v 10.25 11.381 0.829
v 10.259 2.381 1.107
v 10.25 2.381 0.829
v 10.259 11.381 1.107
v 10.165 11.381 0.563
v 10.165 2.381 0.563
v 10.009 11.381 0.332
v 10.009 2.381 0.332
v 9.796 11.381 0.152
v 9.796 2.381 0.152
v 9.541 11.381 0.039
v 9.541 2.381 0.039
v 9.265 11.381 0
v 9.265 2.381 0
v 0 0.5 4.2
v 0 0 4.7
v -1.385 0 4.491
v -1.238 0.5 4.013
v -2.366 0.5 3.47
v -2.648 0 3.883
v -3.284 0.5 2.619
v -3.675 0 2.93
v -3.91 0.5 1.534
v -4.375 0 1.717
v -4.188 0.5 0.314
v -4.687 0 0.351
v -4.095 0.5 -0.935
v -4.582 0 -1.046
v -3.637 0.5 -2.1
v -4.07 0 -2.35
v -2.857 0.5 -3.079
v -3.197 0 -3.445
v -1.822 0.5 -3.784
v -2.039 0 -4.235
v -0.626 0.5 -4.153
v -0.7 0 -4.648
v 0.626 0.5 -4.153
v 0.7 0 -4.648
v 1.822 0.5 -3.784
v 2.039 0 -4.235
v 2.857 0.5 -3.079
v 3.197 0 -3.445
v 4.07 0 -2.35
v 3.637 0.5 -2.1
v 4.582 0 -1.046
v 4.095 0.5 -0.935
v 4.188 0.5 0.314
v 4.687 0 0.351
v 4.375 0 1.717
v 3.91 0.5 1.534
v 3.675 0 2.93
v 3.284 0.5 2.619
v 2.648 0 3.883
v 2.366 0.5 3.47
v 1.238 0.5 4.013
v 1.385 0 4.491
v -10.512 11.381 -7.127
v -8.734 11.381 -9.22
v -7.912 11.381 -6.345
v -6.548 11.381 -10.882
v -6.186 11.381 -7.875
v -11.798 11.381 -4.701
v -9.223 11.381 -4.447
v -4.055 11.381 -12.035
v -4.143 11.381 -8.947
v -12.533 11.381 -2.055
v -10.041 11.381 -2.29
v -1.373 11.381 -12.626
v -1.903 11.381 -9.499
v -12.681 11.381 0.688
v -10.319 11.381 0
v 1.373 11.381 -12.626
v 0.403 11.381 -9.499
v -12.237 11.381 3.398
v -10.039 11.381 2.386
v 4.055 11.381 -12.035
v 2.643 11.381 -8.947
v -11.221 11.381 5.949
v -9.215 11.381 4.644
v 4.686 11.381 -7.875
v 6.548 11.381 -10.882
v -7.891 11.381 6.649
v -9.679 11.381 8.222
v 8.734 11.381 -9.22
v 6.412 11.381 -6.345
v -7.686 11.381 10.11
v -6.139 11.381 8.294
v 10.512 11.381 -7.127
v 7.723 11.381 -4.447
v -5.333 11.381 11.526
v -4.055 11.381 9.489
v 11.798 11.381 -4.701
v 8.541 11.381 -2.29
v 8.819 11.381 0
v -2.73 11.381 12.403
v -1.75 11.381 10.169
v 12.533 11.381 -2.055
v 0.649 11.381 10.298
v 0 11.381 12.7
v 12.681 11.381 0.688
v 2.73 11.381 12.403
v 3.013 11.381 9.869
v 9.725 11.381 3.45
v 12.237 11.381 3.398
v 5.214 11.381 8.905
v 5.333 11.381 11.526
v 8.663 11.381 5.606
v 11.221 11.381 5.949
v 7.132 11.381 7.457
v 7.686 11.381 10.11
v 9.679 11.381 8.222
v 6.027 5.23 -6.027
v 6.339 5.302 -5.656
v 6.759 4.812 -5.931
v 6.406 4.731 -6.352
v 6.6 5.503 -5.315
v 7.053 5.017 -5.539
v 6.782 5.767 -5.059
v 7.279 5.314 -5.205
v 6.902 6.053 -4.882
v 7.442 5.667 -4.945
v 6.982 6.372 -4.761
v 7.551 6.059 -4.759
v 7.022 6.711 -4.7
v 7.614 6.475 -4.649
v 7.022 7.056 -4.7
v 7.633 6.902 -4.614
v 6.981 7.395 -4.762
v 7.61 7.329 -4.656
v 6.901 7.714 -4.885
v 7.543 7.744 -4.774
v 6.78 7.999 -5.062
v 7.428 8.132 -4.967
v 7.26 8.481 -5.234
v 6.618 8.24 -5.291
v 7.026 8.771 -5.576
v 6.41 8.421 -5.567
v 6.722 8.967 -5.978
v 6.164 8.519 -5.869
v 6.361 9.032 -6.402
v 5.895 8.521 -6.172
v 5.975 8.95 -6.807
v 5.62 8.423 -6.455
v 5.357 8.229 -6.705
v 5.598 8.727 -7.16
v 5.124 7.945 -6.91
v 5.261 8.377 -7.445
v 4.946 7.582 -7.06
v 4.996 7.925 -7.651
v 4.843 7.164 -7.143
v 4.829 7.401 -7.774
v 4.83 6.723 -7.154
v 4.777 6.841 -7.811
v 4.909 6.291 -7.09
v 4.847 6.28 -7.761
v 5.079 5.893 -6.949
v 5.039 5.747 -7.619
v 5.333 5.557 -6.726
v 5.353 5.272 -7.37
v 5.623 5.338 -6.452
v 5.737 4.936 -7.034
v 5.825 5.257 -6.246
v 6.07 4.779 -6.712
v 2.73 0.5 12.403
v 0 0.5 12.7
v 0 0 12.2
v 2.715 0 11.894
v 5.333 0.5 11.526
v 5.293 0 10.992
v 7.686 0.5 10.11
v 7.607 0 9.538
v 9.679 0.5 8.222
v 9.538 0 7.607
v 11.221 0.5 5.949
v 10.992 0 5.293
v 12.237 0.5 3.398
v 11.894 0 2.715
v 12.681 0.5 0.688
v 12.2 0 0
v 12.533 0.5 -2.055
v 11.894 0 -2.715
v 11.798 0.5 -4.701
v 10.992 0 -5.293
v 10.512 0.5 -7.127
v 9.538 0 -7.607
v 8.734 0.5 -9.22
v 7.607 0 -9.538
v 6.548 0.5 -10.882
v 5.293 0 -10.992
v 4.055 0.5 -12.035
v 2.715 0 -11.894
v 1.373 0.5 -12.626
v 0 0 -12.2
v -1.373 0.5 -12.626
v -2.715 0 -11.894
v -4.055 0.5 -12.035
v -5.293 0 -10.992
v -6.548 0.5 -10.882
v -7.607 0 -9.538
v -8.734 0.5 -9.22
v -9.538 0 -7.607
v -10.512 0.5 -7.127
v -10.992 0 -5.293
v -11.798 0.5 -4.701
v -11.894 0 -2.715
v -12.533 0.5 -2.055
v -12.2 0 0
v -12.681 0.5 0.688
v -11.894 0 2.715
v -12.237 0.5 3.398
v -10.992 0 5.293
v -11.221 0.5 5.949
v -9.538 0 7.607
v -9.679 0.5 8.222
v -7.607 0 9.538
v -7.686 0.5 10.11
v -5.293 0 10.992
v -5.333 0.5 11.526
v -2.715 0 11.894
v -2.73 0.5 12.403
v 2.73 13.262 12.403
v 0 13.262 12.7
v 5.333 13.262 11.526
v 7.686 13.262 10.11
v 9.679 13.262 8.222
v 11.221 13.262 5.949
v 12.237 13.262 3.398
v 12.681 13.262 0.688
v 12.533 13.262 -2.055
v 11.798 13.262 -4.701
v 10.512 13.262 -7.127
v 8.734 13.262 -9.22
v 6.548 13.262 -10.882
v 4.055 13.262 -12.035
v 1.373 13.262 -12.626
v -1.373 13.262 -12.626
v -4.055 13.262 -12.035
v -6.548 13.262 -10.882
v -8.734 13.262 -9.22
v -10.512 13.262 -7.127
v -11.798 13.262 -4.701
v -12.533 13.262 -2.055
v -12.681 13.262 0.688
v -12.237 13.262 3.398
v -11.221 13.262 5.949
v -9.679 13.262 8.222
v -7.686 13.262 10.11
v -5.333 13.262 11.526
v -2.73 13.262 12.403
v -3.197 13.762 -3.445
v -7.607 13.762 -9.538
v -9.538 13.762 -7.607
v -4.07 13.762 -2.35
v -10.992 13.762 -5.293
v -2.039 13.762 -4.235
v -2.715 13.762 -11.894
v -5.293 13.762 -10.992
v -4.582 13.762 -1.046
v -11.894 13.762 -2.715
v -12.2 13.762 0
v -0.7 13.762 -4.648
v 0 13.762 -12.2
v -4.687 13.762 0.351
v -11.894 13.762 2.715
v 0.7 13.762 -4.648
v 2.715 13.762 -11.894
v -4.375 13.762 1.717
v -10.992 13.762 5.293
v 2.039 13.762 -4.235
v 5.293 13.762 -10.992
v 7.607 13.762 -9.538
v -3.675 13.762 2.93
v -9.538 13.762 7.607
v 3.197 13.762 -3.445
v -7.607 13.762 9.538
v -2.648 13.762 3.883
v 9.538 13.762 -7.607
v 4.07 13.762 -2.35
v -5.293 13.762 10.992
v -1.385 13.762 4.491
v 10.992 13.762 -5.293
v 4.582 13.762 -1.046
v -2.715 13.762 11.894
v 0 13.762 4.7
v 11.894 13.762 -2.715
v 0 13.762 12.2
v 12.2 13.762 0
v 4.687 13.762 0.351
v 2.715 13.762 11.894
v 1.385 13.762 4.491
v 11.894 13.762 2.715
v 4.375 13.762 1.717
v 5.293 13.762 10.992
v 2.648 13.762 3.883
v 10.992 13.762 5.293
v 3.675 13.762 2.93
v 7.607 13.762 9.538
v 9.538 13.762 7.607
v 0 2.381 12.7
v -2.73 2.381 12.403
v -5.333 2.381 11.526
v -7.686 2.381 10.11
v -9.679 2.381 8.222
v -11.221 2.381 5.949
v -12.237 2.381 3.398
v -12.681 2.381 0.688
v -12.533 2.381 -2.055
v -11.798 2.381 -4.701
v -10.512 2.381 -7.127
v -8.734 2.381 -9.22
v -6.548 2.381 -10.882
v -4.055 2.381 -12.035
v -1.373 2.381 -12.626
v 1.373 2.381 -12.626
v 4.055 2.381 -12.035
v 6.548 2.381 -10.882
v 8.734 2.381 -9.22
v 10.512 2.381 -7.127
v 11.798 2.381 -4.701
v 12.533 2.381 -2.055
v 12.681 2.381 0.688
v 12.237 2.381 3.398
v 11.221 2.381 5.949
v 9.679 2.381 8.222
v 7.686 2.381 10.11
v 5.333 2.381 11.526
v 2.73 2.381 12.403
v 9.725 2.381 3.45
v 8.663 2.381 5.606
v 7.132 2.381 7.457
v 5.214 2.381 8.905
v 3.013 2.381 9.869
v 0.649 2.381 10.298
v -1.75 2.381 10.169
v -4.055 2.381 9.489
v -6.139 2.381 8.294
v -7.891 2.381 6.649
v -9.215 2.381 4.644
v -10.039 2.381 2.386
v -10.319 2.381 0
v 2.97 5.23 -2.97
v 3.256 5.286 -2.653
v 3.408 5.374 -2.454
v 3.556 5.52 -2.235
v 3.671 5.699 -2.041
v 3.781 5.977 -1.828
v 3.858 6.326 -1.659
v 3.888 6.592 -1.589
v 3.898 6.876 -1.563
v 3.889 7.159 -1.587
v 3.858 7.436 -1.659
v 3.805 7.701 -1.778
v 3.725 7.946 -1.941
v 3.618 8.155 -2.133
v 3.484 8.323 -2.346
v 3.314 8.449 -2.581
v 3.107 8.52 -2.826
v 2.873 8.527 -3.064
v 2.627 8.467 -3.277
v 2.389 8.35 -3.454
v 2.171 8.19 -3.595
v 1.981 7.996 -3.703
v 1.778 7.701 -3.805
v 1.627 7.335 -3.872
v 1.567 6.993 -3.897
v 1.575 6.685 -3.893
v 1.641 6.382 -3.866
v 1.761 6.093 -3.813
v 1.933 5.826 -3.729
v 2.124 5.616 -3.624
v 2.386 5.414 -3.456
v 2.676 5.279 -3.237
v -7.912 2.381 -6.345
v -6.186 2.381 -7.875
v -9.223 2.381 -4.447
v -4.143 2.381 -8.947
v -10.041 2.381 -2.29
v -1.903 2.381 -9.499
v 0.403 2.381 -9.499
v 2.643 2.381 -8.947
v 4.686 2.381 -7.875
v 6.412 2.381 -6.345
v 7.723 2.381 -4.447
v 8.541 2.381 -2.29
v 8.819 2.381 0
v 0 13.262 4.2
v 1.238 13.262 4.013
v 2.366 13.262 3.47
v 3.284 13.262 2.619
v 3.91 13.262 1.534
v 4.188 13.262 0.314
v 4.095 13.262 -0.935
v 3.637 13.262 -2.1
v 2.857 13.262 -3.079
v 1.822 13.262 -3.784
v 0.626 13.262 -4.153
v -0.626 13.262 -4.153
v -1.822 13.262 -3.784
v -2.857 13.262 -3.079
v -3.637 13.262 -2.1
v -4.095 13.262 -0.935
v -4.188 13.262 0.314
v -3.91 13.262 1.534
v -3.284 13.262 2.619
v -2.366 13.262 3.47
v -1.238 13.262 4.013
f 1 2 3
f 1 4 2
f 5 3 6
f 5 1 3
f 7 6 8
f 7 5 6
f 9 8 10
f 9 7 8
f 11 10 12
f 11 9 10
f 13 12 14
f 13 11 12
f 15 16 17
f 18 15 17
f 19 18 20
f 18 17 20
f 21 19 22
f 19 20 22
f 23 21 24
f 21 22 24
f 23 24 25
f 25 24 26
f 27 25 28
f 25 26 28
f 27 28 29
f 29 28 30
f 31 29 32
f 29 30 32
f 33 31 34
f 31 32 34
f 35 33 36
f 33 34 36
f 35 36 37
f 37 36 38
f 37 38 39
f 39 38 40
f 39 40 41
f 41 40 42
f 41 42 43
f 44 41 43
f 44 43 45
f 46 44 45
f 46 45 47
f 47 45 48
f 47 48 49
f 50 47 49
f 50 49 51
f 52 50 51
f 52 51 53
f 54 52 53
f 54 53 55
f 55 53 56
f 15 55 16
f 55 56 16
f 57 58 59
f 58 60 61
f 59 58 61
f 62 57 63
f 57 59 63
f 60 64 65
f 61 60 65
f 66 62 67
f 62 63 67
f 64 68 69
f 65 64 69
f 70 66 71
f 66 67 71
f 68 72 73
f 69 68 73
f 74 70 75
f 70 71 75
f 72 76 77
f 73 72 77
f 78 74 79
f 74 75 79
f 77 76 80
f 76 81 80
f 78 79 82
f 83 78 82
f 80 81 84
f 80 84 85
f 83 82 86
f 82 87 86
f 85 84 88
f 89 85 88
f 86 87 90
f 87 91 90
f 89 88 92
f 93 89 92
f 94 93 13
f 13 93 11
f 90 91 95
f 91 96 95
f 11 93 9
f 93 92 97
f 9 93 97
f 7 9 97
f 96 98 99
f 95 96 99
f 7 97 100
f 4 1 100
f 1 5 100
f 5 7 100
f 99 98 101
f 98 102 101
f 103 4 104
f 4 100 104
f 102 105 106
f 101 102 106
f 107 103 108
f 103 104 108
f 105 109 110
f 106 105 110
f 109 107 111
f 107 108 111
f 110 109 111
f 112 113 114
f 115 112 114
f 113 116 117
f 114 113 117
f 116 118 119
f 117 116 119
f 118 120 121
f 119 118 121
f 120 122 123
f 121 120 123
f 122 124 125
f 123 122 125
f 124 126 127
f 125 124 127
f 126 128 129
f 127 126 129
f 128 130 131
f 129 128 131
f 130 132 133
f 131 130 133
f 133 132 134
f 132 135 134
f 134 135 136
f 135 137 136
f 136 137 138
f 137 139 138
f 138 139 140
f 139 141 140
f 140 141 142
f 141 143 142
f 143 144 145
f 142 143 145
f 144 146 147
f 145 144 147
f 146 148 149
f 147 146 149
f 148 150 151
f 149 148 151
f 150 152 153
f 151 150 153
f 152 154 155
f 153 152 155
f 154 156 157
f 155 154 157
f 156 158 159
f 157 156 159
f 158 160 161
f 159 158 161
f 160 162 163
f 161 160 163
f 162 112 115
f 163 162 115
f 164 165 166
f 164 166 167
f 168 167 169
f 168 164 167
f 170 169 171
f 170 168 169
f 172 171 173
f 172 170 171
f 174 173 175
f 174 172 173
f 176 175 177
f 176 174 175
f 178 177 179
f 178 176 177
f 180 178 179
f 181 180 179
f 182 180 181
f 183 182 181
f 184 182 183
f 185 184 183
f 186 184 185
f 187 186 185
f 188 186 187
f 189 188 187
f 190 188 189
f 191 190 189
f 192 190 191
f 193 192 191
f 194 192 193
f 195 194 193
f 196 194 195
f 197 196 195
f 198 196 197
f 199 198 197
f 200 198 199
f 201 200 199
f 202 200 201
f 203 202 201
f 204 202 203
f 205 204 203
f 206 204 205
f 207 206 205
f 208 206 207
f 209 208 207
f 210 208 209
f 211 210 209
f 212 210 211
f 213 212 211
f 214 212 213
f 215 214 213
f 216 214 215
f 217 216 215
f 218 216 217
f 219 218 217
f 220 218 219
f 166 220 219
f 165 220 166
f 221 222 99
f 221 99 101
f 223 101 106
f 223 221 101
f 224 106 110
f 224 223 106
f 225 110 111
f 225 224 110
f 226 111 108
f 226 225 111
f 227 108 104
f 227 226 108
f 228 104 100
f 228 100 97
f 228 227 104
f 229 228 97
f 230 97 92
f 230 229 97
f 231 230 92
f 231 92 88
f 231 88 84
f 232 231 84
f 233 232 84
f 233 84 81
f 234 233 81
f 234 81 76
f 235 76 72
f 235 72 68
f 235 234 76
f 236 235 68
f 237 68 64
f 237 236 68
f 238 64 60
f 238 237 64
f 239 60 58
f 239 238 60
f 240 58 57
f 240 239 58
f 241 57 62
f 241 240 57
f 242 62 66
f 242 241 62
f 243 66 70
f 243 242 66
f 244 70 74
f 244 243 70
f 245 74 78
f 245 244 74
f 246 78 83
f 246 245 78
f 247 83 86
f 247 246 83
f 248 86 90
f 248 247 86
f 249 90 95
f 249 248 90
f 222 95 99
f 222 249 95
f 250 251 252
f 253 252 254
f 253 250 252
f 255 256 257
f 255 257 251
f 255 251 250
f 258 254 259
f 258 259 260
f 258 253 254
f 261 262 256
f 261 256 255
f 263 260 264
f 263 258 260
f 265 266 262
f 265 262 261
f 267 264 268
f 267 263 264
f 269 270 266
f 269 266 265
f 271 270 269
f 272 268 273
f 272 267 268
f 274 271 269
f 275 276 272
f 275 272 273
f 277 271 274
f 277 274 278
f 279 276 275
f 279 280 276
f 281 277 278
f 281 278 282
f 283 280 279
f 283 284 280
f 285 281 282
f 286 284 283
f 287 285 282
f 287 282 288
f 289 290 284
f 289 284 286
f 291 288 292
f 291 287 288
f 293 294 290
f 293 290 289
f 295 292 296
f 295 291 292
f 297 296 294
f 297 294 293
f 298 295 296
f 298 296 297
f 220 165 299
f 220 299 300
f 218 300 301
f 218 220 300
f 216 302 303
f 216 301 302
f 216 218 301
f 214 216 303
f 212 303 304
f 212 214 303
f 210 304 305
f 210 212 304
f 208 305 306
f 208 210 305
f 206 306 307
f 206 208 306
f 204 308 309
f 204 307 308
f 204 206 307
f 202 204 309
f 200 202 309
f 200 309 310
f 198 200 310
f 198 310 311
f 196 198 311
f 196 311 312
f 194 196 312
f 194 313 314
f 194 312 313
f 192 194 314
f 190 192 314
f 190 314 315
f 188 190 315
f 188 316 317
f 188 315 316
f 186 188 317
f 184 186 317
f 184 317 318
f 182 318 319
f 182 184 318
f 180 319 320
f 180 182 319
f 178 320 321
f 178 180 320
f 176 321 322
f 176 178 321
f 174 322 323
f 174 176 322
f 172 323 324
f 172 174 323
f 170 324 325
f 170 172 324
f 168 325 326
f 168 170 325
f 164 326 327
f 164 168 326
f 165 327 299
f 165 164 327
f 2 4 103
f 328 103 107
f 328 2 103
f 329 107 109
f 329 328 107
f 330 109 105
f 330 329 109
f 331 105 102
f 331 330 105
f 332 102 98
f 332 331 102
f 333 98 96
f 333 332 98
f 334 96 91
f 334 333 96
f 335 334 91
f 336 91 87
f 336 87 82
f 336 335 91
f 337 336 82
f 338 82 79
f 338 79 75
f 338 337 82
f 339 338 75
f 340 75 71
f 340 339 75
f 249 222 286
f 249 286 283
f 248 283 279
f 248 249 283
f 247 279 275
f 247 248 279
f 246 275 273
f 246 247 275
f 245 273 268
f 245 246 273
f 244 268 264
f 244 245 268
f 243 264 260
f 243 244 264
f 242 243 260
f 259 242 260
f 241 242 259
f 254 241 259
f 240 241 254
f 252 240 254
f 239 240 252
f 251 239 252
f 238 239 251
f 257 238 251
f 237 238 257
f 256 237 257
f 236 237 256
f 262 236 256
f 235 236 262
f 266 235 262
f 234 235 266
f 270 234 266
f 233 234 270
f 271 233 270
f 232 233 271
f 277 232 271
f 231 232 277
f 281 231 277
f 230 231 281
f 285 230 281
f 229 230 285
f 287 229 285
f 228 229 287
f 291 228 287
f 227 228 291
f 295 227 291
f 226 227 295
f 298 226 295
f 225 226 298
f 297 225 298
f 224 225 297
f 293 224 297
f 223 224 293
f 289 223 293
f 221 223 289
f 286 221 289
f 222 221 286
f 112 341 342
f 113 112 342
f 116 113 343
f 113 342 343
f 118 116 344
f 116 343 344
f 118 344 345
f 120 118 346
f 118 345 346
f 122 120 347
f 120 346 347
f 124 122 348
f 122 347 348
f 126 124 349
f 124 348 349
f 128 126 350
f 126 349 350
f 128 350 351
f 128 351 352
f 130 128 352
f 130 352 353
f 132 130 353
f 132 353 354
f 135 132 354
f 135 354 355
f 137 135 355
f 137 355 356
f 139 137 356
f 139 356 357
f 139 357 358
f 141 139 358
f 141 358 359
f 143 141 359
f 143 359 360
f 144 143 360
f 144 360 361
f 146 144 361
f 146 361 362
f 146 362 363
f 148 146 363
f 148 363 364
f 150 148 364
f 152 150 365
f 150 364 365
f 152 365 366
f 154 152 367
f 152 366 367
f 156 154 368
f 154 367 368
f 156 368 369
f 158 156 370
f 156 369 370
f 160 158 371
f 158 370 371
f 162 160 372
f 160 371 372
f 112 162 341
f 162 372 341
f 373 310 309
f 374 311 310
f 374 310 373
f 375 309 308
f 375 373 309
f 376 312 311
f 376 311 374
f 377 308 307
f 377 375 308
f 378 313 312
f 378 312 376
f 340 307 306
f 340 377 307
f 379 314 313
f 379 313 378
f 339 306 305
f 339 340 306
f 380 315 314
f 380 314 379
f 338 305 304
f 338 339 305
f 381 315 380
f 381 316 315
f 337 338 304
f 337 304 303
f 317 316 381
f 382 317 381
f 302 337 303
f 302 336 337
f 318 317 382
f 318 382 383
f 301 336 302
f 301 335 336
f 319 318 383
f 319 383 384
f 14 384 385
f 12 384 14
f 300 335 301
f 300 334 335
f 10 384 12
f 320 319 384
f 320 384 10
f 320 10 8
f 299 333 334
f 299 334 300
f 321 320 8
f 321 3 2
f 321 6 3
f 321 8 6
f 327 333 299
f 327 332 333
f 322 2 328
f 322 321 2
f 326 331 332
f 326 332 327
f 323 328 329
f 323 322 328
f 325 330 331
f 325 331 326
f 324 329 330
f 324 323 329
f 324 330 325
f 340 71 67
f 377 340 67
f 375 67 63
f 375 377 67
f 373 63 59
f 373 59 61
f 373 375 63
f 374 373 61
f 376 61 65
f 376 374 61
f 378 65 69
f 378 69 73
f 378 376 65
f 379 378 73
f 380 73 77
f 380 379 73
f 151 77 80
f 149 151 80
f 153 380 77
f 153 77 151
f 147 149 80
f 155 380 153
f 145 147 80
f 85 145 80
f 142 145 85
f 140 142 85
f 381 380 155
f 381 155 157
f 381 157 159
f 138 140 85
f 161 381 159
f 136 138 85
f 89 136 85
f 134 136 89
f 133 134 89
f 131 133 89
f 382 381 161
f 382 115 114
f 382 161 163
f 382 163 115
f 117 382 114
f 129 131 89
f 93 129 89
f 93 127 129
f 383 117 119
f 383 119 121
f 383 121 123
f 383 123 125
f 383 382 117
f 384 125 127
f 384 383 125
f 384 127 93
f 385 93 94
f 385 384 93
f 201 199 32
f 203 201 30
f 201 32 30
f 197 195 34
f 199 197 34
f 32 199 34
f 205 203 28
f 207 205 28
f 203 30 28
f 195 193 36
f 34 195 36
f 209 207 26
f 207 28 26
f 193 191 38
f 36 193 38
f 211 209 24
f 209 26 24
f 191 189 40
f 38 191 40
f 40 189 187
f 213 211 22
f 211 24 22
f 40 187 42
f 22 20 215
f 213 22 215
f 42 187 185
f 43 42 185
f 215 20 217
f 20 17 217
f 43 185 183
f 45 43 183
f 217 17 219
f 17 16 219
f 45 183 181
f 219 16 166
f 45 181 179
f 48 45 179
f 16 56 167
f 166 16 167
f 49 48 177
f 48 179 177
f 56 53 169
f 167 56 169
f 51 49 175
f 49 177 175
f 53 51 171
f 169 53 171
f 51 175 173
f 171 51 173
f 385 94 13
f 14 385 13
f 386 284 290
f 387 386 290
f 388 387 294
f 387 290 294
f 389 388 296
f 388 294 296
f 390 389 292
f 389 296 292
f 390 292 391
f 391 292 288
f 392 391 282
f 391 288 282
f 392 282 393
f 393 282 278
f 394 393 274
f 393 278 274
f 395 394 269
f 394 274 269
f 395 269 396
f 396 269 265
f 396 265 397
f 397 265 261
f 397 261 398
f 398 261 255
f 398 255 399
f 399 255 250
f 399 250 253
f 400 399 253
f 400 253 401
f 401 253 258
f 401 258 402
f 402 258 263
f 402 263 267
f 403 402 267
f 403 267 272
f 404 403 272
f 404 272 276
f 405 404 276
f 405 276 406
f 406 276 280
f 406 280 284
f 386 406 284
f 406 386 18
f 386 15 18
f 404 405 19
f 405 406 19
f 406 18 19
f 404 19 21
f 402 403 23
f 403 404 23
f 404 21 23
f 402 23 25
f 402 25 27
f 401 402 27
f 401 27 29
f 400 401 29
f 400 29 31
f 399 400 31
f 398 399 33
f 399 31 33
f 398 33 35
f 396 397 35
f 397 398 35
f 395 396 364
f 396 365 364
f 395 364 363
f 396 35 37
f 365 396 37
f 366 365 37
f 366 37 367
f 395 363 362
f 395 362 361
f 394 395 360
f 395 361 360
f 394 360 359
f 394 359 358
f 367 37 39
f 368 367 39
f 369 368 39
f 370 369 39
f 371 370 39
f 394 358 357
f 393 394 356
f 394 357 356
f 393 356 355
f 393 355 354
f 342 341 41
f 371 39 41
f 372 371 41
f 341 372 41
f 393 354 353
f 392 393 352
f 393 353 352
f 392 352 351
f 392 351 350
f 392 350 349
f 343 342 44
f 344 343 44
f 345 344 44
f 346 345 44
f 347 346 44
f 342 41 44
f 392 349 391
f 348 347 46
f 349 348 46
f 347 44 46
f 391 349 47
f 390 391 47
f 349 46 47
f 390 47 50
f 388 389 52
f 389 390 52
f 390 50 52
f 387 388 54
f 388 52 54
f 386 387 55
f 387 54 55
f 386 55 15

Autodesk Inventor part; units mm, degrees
ref_plane "XZ Plane" through (0, 0, 0) normal (0, 1, 0) x (-1, 0, 0)
sketch "Sketch1" plane through (0, 0, 0) normal (1, 0, 0) x (0, 1, 0)
  line L0 (0, 0) -> (13.7625, 0)
  line L1 (13.7625, 0) -> (13.7625, 10.31875)
  line L2 (13.7625, 10.31875) -> (0, 10.31875)
  line L3 (0, 10.31875) -> (0, 0)
  line L4 (13.7625, 10.31875) -> (11.38125, 10.31875)
  line L5 (11.38125, 10.31875) -> (11.38125, 12.7)
  line L6 (11.38125, 12.7) -> (13.7625, 12.7)
  line L7 (13.7625, 12.7) -> (13.7625, 10.31875)
  line L8 (0, 10.31875) -> (2.38125, 10.31875)
  line L9 (2.38125, 10.31875) -> (2.38125, 12.7)
  line L10 (2.38125, 12.7) -> (0, 12.7)
  line L11 (0, 12.7) -> (0, 10.31875)
  line L12 (13.7625, 4.2) -> (0, 4.2)
  line L13 (0, 4.2) -> (0, 0)
  line L14 (0, 0) -> (13.7625, 0)
  line L15 (13.7625, 0) -> (13.7625, 4.2)
  point P0 (0, 4.2)
  dimension "d1" = 10.31875
  dimension "d2" = 2.38125
  dimension "d3" = 2.38125
  dimension "d4" = 12.7
  dimension "d5" = 4.2
  dimension "d29" = 9
revolve "Revolution1" add sketch "Sketch1" angle 360 about axis through (0, 0, 0) along (0, 1, 0) contours L3 L2 L1 L12 | L11 L10 L9 L2 | L2 L5 L6 L7
sketch "Sketch2" plane through (0, 2.38125, 0) normal (0, 1, 0) x (1, 0, 0)
  circle A0 centre (0, 0) radius 4.2
  circle A1 centre (0, 0) radius 6.2
  line L0 (4.2, 0) -> (6.2, 0)
  line L1 (0, 4.2) -> (0, 6.2)
  circle A2 centre (0, 0) radius 10.31875
  line L2 (0, 6.2) -> (-9.425317, 6.2)
  line L3 (-9.425317, 6.2) -> (-9.425317, 4.2)
  line L4 (-9.425317, 4.2) -> (0, 4.2)
  line L5 (0, 4.2) -> (0, 6.2)
  line L6 (10.31875, 0) -> (8.81875, 0)
  arc A3 (8.81875, 0) -> (-10.31875, 0) centre (-0.75, 0) ccw
  dimension "d7" = 2
  dimension "d30" = 1.5
sketch "Sketch2 outline for Extrusion1" plane through (0, 2.38125, 0) normal (0, 1, 0) x (1, 0, 0)
  arc A0 (-10.31875, 0) -> (8.81875, 0) centre (-0.75, 0) cw
  arc A1 (10.31875, 0) -> (-10.31875, 0) centre (0, 0) ccw
  line L0 (8.81875, 0) -> (10.31875, 0)
extrude "Extrusion1" cut sketch "Sketch2 outline for Extrusion1" along normal up to surface (9 mm away)
ref_plane "Work Plane1" through (0, 0, 0) normal (-0.7071068, 0, 0.7071068) x (0, -1, 0)
sketch "Sketch3" plane through (0, 0, 0) normal (-0.7071068, 0, 0.7071068) x (0, -1, 0)
  line L0 (0, 0) -> (-13.7625, 0) construction
  line L1 (-13.7625, 4.2) -> (-13.7625, -4.2)
  circle A0 centre (-6.88125, 0) radius 1.651
  dimension "d12" = 3.302
extrude "Extrusion2" cut sketch "Sketch3" against normal through all
chamfer "Chamfer1" distance 0.5 angle 45 2 edges at (0, 0, -4.2) (0, 13.7625, -4.2)
chamfer "Chamfer2" distance 0.5 angle 45 1 edges at (6.7558, 8.4269, -5.935)
chamfer "Chamfer3" distance 0.5 angle 45 2 edges at (0, 13.7625, -12.7) (0, 0, -12.7)
fillet "Fillet3" radius 1 1 edges at (10.3188, 6.8812, 0)
equation "\"d3\" = d2"
properties part number "Spring Spool" material "Nylon 6/6"
